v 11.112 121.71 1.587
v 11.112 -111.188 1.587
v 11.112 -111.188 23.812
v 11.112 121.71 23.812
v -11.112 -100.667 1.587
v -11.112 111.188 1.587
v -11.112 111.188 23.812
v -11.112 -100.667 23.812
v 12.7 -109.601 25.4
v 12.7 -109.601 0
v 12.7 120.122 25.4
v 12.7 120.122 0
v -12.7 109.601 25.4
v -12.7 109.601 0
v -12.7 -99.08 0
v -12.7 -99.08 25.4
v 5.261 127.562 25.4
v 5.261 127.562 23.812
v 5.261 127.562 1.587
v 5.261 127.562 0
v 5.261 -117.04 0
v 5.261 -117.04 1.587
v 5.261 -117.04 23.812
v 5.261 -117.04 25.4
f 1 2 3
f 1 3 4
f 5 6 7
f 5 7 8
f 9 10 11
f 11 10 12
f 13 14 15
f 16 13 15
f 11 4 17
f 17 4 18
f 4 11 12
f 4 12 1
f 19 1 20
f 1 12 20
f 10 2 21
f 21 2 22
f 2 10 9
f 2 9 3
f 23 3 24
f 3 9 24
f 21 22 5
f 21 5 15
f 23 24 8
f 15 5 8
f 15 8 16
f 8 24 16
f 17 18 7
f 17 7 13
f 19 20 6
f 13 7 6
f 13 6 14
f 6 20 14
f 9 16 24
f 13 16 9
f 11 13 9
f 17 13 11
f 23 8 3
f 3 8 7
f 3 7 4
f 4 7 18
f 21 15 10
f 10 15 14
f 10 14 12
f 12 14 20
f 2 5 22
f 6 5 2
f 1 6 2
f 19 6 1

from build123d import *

# Parameters (mm, degrees)
F1_DEPTH = 25.4
F2_T     = -1.5875
F3_W     = 22.225
F3_H     = 22.225
F4_DEPTH = 262.563512
F6_DEPTH = 25.4


with BuildPart() as f1:
    # F0 (on Top) → F1 (new body)
    with BuildSketch(Plane.XY):
        Polygon((5.260512, 127.561512), (-12.7, 109.601), (-12.7, -135.001), (12.7, -135.001), (12.7, 120.122024), align=None)
    extrude(amount=F1_DEPTH)

    # F2
    f2_openings = [f1.faces().sort_by_distance(p)[0] for p in [
        (0, -135.001, 12.7),
    ]]
    offset(amount=F2_T, openings=f2_openings)

    # F3 (on face) → F4 (cut, through all)
    with BuildSketch(Plane.XZ.offset(135.001)):
        with Locations((0, 12.7)):
            Rectangle(F3_W, F3_H)
    extrude(amount=-F4_DEPTH, mode=Mode.SUBTRACT)

    # F5 (on face) → F6 (cut)
    with BuildSketch(Plane.XY.offset(25.4)):
        Polygon((5.260512, -117.040488), (-12.7, -135.001), (12.7, -135.001), (12.7, -109.601), align=None)
        Polygon((-12.7, -99.079976), (-12.7, -135.001), (5.260512, -117.040488), align=None)
    extrude(amount=-F6_DEPTH, mode=Mode.SUBTRACT)


solid = f1.part
